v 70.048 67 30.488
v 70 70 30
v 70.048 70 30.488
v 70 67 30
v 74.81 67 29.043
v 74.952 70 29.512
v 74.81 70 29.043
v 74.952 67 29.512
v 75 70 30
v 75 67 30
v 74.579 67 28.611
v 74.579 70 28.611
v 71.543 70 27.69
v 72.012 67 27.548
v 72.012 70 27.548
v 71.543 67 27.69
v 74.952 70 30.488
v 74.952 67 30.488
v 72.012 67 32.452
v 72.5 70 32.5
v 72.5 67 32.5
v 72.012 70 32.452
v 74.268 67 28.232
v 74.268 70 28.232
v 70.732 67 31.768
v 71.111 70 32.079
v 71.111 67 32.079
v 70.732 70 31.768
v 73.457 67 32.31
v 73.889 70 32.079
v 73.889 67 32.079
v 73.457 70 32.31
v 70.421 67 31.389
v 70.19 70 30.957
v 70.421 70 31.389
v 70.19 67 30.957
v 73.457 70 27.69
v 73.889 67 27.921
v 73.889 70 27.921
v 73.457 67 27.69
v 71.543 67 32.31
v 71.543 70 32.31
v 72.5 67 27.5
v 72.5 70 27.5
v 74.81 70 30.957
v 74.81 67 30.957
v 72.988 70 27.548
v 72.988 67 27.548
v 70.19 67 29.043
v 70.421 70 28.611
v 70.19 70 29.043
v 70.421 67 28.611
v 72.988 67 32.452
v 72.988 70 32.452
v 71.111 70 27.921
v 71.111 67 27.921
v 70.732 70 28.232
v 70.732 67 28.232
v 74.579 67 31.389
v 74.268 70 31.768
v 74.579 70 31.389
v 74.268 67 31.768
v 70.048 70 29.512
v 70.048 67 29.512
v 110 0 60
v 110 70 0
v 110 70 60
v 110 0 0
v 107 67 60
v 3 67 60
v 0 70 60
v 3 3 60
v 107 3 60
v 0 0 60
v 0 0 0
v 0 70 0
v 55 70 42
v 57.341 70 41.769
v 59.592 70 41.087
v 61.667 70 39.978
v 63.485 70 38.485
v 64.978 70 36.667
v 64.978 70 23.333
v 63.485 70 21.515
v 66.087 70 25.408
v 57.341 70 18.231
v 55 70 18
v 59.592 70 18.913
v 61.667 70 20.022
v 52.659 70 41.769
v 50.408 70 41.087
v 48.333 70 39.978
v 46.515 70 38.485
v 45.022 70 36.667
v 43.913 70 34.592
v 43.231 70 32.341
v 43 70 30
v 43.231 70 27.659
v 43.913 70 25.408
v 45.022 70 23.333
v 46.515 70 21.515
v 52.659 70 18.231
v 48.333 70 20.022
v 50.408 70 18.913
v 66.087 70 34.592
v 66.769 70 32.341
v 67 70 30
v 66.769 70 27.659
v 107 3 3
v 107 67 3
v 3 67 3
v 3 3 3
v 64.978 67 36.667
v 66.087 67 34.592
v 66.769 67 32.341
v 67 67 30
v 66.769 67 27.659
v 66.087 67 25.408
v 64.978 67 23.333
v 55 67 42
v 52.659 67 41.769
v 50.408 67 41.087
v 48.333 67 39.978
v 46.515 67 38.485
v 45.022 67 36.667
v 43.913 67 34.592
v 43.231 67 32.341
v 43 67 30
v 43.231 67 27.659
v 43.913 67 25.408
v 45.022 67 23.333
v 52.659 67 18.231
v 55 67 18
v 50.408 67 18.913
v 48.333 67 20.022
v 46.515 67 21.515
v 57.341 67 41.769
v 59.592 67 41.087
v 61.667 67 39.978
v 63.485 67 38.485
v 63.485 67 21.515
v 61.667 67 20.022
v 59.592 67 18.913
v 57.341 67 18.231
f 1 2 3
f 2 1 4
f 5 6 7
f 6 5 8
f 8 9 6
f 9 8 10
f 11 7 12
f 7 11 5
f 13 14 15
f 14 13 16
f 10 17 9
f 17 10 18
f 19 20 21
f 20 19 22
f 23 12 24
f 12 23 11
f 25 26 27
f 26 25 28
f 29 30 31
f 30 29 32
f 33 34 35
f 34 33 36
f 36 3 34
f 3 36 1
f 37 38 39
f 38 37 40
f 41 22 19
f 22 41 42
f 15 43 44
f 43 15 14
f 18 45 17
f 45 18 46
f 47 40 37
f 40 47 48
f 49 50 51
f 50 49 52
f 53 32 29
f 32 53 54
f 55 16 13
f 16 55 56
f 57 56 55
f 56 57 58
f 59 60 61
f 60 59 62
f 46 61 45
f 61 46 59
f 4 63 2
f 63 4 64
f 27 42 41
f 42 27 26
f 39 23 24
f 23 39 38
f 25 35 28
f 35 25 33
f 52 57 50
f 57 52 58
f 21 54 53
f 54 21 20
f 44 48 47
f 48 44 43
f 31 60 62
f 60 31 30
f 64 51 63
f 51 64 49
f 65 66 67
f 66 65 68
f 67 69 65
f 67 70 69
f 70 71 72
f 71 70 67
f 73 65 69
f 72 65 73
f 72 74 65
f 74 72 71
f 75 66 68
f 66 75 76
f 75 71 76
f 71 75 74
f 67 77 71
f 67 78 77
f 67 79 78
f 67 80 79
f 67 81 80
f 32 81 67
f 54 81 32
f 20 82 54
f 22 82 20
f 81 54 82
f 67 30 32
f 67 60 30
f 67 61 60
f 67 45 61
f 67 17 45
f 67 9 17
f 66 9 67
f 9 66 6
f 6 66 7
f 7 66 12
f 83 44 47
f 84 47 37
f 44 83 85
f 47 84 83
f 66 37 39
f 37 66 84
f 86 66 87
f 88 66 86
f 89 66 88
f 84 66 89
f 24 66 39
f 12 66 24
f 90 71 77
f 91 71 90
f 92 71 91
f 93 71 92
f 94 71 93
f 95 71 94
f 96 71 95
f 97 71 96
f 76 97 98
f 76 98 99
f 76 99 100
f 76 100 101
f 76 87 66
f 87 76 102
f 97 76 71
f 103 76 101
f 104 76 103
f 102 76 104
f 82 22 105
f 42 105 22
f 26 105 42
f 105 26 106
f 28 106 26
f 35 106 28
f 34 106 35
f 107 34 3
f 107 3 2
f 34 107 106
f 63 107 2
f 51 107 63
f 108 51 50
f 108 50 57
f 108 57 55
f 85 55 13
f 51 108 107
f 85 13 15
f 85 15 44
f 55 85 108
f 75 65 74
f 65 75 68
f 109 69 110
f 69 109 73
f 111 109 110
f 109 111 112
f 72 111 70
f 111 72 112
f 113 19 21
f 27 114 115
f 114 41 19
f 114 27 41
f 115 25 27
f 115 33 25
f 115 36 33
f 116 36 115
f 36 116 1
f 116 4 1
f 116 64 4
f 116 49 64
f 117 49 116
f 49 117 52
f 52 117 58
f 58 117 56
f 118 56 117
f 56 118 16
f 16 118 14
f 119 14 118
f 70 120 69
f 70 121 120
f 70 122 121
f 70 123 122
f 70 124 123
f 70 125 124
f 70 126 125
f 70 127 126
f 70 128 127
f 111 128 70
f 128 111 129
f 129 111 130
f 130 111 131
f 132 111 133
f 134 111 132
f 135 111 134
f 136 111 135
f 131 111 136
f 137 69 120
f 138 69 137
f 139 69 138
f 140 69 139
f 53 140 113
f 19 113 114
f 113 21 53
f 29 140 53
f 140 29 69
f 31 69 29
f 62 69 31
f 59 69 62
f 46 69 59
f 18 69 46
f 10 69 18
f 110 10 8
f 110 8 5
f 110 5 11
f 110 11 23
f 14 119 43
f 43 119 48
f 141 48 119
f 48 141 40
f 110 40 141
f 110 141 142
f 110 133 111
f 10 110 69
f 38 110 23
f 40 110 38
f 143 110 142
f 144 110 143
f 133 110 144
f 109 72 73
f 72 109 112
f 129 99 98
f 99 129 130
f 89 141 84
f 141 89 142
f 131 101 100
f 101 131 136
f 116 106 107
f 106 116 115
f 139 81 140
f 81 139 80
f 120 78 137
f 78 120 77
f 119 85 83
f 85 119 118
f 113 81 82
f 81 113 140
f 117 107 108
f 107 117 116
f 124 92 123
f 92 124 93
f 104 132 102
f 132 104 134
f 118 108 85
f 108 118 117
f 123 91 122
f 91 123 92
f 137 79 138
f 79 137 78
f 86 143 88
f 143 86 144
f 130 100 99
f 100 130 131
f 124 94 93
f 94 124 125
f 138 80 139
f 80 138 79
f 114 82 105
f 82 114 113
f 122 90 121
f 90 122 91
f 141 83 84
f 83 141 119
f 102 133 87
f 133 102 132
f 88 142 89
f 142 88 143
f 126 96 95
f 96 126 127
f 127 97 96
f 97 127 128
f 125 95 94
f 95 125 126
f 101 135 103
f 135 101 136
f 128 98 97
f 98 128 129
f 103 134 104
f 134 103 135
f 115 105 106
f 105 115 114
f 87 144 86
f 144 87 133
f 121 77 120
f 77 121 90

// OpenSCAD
$fn = 32;

// ----------------------------------------------------------------------
// Vent box: roundvent enclosure
// ----------------------------------------------------------------------

// --- parameters (mm) ---
box_l = 110;              // box length, X
box_w = 70;               // box width, Y
box_h = 60;               // box height, Z
wall_t = 3;               // shell wall thickness
vent_d = 24;              // central vent diameter
ring_d = 5;               // ring hole diameter
n_ring = 6;               // holes in the ring
ring_r = 17.5;            // ring radius

ring_step = 360 / n_ring;  // ring hole angular step

difference() {
  cube([box_l, box_w, box_h]);
  translate([wall_t, wall_t, wall_t])
    cube([box_l - 2 * wall_t, box_w - 2 * wall_t, box_h]);
  translate([box_l / 2, box_w - wall_t - 1, box_h / 2])
    rotate([-90, 0, 0]) cylinder(h = wall_t + 2, d = vent_d);
  for (i = [0 : n_ring - 1])
    translate([box_l / 2, box_w - wall_t - 1, box_h / 2])
      rotate([0, 0, i * ring_step])
        translate([ring_r, 0, 0]) rotate([-90, 0, 0])
          cylinder(h = wall_t + 2, d = ring_d);
}
